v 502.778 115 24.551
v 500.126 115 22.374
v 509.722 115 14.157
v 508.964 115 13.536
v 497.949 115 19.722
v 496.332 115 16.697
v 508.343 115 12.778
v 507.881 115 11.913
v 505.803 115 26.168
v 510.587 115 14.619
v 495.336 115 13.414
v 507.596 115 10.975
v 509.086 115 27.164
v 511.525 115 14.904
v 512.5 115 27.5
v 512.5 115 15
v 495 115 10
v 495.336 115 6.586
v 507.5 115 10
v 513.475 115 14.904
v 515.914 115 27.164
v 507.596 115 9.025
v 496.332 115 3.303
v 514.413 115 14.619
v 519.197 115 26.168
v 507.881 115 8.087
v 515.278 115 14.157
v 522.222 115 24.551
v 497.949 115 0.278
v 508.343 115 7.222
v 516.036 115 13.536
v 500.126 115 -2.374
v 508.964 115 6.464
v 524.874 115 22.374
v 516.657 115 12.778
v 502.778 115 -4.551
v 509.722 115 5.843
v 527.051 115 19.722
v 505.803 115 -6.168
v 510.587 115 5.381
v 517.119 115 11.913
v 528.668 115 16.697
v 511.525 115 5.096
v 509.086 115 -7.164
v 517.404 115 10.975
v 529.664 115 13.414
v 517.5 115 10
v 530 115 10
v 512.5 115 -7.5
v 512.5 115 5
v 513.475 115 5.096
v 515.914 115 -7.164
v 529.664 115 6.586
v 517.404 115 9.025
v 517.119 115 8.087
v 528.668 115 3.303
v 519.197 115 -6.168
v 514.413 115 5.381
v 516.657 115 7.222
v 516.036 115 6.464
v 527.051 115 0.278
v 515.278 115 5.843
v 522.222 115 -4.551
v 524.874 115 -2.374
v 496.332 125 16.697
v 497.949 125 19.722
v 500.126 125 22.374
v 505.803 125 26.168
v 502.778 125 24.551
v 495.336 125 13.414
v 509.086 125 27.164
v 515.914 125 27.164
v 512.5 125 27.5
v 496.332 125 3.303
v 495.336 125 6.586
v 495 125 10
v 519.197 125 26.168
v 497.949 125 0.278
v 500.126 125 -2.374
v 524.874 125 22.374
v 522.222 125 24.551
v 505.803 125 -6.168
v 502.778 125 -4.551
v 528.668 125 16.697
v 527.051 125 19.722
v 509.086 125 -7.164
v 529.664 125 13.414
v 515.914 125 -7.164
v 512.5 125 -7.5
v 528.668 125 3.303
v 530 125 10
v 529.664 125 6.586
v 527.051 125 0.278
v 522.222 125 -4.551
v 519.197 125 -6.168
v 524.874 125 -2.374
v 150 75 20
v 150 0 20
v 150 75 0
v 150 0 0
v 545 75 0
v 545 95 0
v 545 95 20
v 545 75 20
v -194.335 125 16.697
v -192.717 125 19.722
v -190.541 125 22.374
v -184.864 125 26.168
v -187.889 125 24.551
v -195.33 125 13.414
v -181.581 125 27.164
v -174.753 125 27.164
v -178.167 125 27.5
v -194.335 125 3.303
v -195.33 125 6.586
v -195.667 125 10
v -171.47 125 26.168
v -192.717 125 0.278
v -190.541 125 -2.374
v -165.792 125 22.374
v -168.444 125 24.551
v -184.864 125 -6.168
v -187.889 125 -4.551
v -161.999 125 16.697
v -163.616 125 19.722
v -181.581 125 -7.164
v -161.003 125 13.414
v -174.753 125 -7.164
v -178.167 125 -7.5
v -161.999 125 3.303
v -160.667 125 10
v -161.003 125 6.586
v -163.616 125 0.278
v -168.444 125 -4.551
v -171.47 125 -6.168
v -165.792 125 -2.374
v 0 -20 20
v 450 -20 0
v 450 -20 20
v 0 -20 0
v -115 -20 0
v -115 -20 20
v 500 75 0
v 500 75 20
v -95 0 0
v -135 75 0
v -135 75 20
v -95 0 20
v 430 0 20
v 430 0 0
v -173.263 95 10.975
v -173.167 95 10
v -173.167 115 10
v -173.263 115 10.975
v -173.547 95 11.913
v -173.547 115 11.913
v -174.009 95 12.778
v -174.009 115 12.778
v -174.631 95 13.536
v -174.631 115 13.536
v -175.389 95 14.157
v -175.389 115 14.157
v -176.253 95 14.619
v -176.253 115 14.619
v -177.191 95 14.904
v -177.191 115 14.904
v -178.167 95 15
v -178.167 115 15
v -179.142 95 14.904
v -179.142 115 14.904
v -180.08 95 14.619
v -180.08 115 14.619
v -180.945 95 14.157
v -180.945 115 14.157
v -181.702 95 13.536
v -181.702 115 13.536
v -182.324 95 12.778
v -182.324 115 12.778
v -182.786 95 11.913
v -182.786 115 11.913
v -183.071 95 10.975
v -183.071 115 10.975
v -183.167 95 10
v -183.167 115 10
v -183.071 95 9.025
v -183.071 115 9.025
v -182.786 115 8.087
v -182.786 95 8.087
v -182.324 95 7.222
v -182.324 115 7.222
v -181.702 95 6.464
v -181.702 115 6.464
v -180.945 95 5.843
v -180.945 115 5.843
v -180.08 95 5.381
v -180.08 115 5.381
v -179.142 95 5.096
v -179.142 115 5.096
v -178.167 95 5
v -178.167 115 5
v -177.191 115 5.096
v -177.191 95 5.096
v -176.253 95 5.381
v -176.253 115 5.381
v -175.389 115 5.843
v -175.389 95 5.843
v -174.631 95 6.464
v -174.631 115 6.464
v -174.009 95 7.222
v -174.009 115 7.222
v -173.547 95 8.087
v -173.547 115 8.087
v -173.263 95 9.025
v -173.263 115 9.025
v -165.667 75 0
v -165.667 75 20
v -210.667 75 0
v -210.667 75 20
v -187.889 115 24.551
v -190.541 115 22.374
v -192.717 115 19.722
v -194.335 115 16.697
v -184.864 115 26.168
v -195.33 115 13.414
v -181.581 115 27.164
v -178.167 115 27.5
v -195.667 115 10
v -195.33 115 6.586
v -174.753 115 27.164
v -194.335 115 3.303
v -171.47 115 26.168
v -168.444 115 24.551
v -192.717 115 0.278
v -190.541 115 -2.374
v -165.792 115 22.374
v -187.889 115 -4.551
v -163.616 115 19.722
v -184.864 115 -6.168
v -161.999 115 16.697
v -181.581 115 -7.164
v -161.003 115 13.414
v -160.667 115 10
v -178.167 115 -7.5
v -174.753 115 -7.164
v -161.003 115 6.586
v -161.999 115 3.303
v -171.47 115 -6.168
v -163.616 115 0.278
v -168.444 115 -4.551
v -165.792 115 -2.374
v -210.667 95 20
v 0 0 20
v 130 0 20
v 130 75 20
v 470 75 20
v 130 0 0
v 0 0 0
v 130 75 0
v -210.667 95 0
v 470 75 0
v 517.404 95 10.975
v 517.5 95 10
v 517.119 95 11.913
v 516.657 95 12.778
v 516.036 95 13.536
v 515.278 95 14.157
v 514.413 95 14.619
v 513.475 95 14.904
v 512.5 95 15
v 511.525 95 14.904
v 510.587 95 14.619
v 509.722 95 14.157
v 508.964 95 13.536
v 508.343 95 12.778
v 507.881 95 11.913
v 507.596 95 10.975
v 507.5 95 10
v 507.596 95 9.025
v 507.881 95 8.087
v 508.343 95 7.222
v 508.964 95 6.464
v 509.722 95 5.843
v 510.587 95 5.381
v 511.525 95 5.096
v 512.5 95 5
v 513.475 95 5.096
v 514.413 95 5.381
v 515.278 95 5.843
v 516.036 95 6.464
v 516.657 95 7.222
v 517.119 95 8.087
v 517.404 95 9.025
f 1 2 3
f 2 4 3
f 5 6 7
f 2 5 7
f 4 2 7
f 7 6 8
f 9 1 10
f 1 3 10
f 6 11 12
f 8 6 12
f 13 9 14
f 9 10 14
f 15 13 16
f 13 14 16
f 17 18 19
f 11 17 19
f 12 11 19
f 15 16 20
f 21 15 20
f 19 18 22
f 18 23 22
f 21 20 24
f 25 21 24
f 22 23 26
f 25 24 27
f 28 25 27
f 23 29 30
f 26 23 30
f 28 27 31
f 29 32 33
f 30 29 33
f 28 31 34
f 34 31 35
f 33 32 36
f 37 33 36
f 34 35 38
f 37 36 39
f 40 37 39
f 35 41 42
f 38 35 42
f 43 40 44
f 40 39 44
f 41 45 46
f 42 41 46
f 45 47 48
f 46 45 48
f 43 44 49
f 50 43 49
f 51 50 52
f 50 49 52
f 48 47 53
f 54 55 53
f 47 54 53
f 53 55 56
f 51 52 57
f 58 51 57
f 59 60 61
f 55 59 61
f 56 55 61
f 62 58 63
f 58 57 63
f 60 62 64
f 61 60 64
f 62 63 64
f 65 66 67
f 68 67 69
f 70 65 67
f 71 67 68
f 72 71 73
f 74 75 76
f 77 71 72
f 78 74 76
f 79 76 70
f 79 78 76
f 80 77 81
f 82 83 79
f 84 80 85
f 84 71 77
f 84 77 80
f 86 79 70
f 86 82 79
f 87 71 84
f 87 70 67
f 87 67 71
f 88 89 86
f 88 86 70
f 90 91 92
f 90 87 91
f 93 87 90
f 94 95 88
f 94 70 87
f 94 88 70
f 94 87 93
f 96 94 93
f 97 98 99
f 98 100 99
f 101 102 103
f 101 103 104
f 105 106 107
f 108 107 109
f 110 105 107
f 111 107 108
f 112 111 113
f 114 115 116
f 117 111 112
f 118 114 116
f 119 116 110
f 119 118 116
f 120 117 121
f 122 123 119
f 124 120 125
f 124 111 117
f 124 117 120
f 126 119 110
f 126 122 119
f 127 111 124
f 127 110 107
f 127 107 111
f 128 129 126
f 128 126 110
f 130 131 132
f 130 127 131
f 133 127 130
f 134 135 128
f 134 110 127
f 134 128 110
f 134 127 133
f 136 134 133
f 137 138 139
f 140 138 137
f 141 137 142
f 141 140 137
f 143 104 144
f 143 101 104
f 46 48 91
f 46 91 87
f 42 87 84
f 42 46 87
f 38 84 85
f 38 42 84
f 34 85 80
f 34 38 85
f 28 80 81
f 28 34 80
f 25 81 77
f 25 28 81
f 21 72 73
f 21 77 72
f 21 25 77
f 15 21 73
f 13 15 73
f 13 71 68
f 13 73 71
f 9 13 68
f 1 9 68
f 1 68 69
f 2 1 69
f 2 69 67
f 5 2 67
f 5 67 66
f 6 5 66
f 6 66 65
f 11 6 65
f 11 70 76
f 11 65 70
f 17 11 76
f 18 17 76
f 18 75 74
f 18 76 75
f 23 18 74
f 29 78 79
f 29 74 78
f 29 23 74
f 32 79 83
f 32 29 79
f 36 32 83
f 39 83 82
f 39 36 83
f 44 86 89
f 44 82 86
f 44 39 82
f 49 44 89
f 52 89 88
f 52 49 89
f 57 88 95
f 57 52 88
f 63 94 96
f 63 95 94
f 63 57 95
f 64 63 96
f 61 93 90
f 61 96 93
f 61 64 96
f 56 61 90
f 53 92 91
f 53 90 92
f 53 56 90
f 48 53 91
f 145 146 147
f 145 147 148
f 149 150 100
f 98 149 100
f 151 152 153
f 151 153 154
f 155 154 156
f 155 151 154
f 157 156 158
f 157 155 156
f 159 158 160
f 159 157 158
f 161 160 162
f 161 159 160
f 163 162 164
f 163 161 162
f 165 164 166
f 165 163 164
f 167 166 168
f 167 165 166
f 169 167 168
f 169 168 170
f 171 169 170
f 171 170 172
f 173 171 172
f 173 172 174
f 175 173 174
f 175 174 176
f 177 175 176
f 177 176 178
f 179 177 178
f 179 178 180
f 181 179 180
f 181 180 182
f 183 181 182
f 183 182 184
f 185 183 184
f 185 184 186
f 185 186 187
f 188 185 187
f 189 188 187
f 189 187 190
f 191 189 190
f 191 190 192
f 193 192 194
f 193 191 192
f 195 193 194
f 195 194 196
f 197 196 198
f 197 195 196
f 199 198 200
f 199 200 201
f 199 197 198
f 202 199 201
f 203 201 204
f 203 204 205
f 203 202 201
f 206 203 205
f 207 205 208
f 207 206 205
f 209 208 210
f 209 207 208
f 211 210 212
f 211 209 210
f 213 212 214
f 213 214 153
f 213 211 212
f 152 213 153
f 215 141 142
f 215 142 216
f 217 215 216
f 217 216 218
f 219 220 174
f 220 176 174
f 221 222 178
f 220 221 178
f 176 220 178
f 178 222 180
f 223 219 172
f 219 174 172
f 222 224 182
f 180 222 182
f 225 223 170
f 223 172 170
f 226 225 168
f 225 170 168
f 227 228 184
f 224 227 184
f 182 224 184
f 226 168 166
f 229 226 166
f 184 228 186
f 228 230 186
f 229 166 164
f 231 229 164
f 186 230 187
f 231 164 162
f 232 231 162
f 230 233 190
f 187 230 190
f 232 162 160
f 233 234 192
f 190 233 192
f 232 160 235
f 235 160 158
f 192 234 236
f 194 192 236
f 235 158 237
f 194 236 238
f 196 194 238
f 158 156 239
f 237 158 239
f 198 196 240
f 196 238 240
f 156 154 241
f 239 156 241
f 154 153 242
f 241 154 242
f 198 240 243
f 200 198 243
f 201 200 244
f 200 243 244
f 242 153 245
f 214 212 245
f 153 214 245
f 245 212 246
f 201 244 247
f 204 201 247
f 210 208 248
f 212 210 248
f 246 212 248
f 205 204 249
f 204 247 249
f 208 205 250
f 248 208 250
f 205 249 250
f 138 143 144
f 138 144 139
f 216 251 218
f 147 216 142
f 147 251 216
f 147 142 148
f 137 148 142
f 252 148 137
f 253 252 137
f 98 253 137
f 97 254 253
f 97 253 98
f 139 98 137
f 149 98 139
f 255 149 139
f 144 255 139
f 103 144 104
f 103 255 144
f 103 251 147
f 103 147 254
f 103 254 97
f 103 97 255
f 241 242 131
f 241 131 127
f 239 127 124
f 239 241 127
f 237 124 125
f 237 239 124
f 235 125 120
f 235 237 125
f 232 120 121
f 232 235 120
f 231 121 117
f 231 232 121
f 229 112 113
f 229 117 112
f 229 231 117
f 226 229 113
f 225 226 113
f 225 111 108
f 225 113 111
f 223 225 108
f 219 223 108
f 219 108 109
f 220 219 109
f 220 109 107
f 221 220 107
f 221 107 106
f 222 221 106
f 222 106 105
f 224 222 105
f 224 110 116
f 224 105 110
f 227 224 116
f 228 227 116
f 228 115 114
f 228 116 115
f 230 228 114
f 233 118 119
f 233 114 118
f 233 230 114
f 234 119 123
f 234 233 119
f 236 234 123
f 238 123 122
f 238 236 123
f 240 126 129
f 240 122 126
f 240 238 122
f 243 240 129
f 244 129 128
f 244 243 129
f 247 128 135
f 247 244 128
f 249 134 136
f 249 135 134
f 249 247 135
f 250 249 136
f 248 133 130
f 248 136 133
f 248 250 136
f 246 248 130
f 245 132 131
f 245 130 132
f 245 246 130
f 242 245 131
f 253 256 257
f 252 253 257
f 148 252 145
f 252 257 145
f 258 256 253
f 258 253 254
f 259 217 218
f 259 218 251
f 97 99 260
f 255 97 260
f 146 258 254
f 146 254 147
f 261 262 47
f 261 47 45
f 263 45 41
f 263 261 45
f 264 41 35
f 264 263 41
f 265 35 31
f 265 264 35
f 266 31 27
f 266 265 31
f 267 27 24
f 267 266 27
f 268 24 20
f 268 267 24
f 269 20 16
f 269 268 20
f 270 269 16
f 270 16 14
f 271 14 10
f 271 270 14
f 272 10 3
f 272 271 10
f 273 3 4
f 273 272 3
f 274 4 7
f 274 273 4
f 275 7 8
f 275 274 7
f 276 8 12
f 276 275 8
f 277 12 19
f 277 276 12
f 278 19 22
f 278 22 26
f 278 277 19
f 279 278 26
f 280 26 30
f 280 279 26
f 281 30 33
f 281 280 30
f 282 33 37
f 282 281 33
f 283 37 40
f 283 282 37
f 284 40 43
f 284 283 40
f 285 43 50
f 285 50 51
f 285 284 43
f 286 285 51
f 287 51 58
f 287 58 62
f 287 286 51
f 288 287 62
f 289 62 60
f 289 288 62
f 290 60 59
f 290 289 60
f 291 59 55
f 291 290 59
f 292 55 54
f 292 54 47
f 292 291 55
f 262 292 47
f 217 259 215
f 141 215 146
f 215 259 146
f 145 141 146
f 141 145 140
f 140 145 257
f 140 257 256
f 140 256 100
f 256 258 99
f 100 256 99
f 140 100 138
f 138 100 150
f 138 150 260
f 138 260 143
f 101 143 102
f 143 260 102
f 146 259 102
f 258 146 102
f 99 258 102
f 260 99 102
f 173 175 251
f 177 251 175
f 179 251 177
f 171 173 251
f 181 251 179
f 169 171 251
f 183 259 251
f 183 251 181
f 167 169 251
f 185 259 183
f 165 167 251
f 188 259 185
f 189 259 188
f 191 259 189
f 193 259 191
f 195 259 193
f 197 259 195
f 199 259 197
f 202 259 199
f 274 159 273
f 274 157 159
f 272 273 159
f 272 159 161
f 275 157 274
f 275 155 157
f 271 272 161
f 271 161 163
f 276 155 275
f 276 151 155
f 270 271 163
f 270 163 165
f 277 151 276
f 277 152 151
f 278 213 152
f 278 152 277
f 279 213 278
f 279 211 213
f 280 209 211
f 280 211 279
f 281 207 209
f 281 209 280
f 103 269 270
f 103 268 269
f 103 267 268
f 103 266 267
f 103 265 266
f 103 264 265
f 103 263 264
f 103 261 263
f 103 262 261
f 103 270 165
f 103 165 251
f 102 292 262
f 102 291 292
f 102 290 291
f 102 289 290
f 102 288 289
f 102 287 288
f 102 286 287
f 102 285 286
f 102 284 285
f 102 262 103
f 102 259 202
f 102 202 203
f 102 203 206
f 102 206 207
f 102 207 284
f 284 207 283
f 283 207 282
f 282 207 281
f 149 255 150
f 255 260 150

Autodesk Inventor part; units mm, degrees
ref_plane "YZ Plane" through (0, 0, 0) normal (1, 0, 0) x (0, 1, 0)
ref_plane "XZ Plane" through (0, 0, 0) normal (0, 1, 0) x (-1, 0, 0)
ref_plane "XY Plane" through (0, 0, 0) normal (0, 0, 1) x (1, 0, 0)
sketch "草圖1" plane through (0, 0, 0) normal (0, 0, 1) x (1, 0, 0)
  line L0 (0, 0) -> (0, -20)
  line L1 (0, -20) -> (-115, -20)
  line L2 (0, -20) -> (450, -20)
  line L3 (167.5, 0) -> (430, 0)
  line L4 (167.5, 0) -> (-95, 0)
  line L5 (167.5, 75) -> (470, 75)
  line L6 (470, 75) -> (430, 0)
  line L7 (167.5, 75) -> (-135, 75)
  line L8 (-135, 75) -> (-95, 0)
  line L9 (130, 0) -> (130, 75)
  line L10 (130, 0) -> (150, 0)
  line L11 (150, 0) -> (150, 75)
  line L12 (167.5, 95) -> (545, 95)
  line L13 (545, 95) -> (545, 75)
  line L14 (545, 75) -> (500, 75)
  line L15 (500, 75) -> (450, -20)
  line L16 (-115, -20) -> (-165.6667, 75)
  line L17 (-165.6667, 75) -> (-210.6667, 75)
  line L18 (-210.6667, 75) -> (-210.6667, 95)
  line L19 (-210.6667, 95) -> (167.5, 95)
  dimension "d0" = 20
  dimension "d1" = 115
  dimension "d2" = 450
  dimension "d6" = 262.5
  dimension "d7" = 262.5
  dimension "d8" = 302.5
  dimension "d9" = 302.5
  dimension "d11" = 20
  dimension "d12" = 75
  dimension "d14" = 377.5
  dimension "d15" = 20
  dimension "d16" = 45
  dimension "d17" = 45
  dimension "d18" = 20
extrude "擠出1" add sketch "草圖1" along normal blind 20 contours L1 L16 L17 L18 L19 L12 L13 L14 L15 L2 | L9 L7 L11 L4
sketch "草圖2" plane through (-210.6667, 95, 0) normal (0, 1, 0) x (1, 0, 0)
  line L0 (0, 0) -> (0, -20) projected
  circle A0 centre (0, -10) radius 32.5
  circle A1 centre (32.5, -10) radius 5
  line L1 (755.6667, 0) -> (755.6667, -20) projected
  circle A2 centre (755.6667, -10) radius 32.5
  circle A3 centre (723.1667, -10) radius 5
  point P0 (210.6667, 0)
  dimension "d21" = 65
  dimension "d23" = 65
  dimension "d22" = 10
  dimension "d24" = 10
extrude "擠出2" add sketch "草圖2" along normal blind 20 contours A0 A1 | A0 A1 | A3 A2 | A2 A3 picked at (30.8705, -10.9665) picked at (33.9711, -11.3119) picked at (724.8619, -10) picked at (721.5286, -10)
sketch "草圖3" plane through (512.5, 115, 10) normal (0, 1, 0) x (1, 0, 0)
  circle A0 centre (0, 0) radius 17.5
  point P0 (-512.5, 10)
  dimension "d27" = 35
extrude "擠出3" add sketch "草圖3" along normal blind 10
sketch "草圖4" plane through (-178.1667, 115, 10) normal (0, 1, 0) x (1, 0, 0)
  circle A0 centre (0, 0) radius 5 projected
  circle A1 centre (0, 0) radius 17.5
  point P0 (178.1667, 10)
  dimension "d30" = 35
extrude "擠出4" add sketch "草圖4" along normal blind 10 contours A0 | A1
properties part number "DOF8"
